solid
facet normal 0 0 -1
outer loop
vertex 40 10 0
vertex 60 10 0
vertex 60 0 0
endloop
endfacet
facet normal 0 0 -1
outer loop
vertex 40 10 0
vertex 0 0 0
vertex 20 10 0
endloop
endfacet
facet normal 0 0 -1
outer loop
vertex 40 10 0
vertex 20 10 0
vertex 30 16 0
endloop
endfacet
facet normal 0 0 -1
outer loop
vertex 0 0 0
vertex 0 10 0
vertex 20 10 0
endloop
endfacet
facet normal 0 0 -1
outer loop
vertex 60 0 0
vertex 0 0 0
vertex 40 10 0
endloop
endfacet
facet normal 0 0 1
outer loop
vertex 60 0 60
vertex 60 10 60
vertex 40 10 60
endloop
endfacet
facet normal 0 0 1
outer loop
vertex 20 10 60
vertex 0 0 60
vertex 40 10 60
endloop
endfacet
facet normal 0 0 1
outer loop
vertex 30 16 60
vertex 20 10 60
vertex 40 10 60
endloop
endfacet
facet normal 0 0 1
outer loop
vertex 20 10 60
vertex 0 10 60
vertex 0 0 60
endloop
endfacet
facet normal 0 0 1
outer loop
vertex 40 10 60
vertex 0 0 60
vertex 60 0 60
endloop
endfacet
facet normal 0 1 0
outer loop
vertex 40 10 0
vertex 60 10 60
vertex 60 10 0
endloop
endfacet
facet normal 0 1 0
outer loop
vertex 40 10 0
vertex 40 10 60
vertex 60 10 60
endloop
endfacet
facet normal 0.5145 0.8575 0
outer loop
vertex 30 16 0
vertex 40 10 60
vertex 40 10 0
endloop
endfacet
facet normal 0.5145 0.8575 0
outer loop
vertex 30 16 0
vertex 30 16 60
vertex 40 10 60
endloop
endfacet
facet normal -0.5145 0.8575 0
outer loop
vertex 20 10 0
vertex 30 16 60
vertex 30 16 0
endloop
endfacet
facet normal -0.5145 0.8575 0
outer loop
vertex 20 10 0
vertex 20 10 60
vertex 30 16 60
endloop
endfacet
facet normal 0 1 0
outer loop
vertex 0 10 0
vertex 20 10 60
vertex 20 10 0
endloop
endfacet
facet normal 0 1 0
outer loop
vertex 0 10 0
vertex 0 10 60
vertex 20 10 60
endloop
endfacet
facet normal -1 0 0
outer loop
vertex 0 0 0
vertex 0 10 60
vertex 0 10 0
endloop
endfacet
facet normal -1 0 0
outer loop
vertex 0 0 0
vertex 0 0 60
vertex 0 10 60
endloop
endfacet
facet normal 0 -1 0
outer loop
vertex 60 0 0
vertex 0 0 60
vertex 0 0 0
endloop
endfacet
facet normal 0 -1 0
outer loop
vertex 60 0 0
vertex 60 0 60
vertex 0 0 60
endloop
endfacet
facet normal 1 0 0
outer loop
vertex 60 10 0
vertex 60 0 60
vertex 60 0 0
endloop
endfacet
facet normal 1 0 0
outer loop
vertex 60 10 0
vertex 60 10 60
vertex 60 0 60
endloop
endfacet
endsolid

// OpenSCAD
$fn = 32;

// ----------------------------------------------------------------------
// V guide rail: vrib, 60 mm wide
// ----------------------------------------------------------------------

// --- parameters (mm) ---
rail_w = 60;              // rail width, X
base_t = 10;              // base plate thickness
v_depth = 6;              // V feature depth / height
v_half_w = 10;            // half width of the V at the base face
plate_t = 60;             // rail length, Z (the extrusion height)

profile = [[0, 0], [60, 0], [60, 10], [40, 10], [30, 16], [20, 10], [0, 10]];  // primary outline, 7 points, counter clockwise

// --- the one profile operation ---
linear_extrude(height = plate_t) polygon(points = profile);
